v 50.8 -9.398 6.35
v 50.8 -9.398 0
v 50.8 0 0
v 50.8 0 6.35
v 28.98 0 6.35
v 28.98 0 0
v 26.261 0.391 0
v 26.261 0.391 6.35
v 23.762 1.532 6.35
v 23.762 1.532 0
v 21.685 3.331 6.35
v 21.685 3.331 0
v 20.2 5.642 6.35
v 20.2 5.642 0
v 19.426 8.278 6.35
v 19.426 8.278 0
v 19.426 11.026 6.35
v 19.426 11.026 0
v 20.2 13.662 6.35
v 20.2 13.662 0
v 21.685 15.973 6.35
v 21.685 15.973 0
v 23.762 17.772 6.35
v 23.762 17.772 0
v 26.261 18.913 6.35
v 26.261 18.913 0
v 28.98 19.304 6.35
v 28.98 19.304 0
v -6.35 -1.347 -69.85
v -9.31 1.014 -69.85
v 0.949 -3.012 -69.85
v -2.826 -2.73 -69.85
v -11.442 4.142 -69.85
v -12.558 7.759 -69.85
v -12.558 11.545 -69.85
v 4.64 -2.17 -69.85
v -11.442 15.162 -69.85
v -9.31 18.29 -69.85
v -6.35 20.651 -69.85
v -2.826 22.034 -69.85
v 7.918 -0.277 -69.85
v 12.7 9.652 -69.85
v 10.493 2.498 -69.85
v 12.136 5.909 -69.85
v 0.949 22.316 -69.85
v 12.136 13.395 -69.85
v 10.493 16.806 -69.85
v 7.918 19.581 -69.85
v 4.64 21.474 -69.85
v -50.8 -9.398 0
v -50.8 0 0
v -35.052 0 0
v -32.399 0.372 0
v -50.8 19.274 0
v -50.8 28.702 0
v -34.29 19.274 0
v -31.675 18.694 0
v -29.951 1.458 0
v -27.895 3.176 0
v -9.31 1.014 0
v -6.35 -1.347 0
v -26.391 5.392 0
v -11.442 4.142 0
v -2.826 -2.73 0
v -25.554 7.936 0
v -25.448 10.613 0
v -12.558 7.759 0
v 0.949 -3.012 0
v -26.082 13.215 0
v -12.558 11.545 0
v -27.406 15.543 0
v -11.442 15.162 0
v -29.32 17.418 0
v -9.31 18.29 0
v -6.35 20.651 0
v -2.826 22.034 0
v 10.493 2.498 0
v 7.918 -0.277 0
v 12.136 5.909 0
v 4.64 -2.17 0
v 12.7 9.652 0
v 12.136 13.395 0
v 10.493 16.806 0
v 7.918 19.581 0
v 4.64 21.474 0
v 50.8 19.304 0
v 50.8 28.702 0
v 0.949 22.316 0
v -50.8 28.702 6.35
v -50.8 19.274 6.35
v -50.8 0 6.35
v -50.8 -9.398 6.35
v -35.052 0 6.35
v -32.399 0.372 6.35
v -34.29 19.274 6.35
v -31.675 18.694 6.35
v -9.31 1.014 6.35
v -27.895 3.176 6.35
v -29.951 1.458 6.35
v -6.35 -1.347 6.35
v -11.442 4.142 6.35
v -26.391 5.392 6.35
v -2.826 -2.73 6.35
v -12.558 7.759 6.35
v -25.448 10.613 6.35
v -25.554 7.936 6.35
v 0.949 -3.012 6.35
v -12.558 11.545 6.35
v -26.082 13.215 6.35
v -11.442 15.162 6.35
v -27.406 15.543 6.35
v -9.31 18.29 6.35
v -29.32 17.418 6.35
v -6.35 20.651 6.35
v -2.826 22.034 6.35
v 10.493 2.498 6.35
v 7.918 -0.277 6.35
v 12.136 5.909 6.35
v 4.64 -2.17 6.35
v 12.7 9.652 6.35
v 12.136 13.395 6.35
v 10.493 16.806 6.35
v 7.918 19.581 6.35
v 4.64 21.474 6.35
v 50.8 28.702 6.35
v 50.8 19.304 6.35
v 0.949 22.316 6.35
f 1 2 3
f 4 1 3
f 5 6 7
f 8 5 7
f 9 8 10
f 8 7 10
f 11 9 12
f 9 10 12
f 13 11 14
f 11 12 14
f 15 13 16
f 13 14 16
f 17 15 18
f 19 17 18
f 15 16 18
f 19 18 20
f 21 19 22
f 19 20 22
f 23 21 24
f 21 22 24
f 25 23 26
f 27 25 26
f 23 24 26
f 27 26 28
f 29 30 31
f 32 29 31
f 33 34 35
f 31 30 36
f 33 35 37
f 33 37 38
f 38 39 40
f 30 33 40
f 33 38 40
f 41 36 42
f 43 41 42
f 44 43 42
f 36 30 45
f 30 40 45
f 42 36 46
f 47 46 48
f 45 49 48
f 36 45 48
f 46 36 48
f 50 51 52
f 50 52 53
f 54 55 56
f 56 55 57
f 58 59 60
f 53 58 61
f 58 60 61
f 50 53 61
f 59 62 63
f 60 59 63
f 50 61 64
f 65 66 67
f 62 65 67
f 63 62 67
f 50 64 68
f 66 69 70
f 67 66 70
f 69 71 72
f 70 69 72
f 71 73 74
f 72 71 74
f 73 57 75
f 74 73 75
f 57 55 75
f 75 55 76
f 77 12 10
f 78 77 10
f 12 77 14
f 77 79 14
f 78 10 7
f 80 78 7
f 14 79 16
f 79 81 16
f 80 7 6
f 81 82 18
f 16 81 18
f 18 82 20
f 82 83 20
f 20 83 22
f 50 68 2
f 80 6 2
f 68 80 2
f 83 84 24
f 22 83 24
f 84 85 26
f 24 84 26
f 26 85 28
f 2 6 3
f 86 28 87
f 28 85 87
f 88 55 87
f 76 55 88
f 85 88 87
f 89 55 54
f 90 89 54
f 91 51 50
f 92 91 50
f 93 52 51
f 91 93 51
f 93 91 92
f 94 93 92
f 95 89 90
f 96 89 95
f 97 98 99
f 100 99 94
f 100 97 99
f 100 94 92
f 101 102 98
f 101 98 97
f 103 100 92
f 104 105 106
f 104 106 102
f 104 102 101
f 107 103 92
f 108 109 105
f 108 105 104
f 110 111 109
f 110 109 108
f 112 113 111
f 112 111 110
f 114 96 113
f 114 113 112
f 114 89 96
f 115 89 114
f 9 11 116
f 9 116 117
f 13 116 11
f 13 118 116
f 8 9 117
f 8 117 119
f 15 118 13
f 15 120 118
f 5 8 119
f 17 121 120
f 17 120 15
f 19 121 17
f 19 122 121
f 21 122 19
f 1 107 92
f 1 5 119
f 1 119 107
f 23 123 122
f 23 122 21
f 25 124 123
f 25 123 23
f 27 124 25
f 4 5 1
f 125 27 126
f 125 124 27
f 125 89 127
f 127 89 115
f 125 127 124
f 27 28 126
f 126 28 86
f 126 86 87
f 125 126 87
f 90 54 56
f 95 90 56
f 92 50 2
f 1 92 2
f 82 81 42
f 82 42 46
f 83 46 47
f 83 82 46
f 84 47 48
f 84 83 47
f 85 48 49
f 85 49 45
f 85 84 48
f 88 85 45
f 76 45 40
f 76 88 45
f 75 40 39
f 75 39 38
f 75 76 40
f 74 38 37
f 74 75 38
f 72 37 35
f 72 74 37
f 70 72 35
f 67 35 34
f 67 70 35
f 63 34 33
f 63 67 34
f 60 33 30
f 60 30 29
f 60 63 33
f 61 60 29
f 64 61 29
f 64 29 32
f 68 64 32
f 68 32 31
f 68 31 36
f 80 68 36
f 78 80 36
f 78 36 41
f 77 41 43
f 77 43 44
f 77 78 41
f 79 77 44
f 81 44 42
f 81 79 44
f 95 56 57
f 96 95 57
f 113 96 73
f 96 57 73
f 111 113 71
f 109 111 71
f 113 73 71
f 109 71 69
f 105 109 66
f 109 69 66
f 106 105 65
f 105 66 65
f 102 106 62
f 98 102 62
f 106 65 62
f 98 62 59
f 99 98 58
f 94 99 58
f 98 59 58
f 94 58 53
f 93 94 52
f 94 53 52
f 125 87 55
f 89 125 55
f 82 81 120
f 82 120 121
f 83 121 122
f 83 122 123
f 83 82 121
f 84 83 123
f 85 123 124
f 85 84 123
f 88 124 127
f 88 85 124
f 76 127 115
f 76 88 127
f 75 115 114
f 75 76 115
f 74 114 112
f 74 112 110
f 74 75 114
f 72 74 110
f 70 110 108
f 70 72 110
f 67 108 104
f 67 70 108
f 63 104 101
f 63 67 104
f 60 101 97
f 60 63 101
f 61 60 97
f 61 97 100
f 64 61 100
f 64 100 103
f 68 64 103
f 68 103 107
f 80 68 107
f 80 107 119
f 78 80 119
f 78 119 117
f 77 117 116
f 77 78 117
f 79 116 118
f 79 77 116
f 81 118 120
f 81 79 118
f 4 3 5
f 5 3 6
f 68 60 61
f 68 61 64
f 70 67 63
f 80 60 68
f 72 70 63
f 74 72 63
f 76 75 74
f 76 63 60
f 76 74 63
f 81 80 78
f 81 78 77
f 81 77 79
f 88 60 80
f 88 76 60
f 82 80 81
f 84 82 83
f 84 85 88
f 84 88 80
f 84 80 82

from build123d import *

# Parameters (mm, degrees)
F0_R     = 12.7
F1_DEPTH = 6.35
F2_R     = 12.7
F3_DEPTH = 69.85


with BuildPart() as f1:
    # F0 (on Top) → F1 (new body)
    with BuildSketch(Plane.XY):
        with BuildLine():
            Line((-50.8, 28.702), (-50.8, 19.273874))
            Line((-50.8, 19.273874), (-34.29, 19.273874))
            ThreePointArc((-34.29, 19.273874), (-25.407534, 9.270702), (-35.052, 0))
            Line((-35.052, 0), (-50.8, 0))
            Line((-50.8, 0), (-50.8, -9.398))
            Line((-50.8, -9.398), (50.8, -9.398))
            Line((50.8, -9.398), (50.8, 0))
            Line((50.8, 0), (28.979867, 0))
            ThreePointArc((28.979867, 0), (19.327867, 9.652), (28.979867, 19.304))
            Line((28.979867, 19.304), (50.8, 19.304))
            Line((50.8, 19.304), (50.8, 28.702))
            Line((50.8, 28.702), (-50.8, 28.702))
        make_face()
        with Locations((0, 9.652)):
            Circle(F0_R, mode=Mode.SUBTRACT)
    extrude(amount=F1_DEPTH)

    # F2 (on Top) → F3 (join)
    with BuildSketch(Plane.XY):
        with Locations((0, 9.652)):
            Circle(F2_R)
    extrude(amount=-F3_DEPTH)


solid = f1.part
